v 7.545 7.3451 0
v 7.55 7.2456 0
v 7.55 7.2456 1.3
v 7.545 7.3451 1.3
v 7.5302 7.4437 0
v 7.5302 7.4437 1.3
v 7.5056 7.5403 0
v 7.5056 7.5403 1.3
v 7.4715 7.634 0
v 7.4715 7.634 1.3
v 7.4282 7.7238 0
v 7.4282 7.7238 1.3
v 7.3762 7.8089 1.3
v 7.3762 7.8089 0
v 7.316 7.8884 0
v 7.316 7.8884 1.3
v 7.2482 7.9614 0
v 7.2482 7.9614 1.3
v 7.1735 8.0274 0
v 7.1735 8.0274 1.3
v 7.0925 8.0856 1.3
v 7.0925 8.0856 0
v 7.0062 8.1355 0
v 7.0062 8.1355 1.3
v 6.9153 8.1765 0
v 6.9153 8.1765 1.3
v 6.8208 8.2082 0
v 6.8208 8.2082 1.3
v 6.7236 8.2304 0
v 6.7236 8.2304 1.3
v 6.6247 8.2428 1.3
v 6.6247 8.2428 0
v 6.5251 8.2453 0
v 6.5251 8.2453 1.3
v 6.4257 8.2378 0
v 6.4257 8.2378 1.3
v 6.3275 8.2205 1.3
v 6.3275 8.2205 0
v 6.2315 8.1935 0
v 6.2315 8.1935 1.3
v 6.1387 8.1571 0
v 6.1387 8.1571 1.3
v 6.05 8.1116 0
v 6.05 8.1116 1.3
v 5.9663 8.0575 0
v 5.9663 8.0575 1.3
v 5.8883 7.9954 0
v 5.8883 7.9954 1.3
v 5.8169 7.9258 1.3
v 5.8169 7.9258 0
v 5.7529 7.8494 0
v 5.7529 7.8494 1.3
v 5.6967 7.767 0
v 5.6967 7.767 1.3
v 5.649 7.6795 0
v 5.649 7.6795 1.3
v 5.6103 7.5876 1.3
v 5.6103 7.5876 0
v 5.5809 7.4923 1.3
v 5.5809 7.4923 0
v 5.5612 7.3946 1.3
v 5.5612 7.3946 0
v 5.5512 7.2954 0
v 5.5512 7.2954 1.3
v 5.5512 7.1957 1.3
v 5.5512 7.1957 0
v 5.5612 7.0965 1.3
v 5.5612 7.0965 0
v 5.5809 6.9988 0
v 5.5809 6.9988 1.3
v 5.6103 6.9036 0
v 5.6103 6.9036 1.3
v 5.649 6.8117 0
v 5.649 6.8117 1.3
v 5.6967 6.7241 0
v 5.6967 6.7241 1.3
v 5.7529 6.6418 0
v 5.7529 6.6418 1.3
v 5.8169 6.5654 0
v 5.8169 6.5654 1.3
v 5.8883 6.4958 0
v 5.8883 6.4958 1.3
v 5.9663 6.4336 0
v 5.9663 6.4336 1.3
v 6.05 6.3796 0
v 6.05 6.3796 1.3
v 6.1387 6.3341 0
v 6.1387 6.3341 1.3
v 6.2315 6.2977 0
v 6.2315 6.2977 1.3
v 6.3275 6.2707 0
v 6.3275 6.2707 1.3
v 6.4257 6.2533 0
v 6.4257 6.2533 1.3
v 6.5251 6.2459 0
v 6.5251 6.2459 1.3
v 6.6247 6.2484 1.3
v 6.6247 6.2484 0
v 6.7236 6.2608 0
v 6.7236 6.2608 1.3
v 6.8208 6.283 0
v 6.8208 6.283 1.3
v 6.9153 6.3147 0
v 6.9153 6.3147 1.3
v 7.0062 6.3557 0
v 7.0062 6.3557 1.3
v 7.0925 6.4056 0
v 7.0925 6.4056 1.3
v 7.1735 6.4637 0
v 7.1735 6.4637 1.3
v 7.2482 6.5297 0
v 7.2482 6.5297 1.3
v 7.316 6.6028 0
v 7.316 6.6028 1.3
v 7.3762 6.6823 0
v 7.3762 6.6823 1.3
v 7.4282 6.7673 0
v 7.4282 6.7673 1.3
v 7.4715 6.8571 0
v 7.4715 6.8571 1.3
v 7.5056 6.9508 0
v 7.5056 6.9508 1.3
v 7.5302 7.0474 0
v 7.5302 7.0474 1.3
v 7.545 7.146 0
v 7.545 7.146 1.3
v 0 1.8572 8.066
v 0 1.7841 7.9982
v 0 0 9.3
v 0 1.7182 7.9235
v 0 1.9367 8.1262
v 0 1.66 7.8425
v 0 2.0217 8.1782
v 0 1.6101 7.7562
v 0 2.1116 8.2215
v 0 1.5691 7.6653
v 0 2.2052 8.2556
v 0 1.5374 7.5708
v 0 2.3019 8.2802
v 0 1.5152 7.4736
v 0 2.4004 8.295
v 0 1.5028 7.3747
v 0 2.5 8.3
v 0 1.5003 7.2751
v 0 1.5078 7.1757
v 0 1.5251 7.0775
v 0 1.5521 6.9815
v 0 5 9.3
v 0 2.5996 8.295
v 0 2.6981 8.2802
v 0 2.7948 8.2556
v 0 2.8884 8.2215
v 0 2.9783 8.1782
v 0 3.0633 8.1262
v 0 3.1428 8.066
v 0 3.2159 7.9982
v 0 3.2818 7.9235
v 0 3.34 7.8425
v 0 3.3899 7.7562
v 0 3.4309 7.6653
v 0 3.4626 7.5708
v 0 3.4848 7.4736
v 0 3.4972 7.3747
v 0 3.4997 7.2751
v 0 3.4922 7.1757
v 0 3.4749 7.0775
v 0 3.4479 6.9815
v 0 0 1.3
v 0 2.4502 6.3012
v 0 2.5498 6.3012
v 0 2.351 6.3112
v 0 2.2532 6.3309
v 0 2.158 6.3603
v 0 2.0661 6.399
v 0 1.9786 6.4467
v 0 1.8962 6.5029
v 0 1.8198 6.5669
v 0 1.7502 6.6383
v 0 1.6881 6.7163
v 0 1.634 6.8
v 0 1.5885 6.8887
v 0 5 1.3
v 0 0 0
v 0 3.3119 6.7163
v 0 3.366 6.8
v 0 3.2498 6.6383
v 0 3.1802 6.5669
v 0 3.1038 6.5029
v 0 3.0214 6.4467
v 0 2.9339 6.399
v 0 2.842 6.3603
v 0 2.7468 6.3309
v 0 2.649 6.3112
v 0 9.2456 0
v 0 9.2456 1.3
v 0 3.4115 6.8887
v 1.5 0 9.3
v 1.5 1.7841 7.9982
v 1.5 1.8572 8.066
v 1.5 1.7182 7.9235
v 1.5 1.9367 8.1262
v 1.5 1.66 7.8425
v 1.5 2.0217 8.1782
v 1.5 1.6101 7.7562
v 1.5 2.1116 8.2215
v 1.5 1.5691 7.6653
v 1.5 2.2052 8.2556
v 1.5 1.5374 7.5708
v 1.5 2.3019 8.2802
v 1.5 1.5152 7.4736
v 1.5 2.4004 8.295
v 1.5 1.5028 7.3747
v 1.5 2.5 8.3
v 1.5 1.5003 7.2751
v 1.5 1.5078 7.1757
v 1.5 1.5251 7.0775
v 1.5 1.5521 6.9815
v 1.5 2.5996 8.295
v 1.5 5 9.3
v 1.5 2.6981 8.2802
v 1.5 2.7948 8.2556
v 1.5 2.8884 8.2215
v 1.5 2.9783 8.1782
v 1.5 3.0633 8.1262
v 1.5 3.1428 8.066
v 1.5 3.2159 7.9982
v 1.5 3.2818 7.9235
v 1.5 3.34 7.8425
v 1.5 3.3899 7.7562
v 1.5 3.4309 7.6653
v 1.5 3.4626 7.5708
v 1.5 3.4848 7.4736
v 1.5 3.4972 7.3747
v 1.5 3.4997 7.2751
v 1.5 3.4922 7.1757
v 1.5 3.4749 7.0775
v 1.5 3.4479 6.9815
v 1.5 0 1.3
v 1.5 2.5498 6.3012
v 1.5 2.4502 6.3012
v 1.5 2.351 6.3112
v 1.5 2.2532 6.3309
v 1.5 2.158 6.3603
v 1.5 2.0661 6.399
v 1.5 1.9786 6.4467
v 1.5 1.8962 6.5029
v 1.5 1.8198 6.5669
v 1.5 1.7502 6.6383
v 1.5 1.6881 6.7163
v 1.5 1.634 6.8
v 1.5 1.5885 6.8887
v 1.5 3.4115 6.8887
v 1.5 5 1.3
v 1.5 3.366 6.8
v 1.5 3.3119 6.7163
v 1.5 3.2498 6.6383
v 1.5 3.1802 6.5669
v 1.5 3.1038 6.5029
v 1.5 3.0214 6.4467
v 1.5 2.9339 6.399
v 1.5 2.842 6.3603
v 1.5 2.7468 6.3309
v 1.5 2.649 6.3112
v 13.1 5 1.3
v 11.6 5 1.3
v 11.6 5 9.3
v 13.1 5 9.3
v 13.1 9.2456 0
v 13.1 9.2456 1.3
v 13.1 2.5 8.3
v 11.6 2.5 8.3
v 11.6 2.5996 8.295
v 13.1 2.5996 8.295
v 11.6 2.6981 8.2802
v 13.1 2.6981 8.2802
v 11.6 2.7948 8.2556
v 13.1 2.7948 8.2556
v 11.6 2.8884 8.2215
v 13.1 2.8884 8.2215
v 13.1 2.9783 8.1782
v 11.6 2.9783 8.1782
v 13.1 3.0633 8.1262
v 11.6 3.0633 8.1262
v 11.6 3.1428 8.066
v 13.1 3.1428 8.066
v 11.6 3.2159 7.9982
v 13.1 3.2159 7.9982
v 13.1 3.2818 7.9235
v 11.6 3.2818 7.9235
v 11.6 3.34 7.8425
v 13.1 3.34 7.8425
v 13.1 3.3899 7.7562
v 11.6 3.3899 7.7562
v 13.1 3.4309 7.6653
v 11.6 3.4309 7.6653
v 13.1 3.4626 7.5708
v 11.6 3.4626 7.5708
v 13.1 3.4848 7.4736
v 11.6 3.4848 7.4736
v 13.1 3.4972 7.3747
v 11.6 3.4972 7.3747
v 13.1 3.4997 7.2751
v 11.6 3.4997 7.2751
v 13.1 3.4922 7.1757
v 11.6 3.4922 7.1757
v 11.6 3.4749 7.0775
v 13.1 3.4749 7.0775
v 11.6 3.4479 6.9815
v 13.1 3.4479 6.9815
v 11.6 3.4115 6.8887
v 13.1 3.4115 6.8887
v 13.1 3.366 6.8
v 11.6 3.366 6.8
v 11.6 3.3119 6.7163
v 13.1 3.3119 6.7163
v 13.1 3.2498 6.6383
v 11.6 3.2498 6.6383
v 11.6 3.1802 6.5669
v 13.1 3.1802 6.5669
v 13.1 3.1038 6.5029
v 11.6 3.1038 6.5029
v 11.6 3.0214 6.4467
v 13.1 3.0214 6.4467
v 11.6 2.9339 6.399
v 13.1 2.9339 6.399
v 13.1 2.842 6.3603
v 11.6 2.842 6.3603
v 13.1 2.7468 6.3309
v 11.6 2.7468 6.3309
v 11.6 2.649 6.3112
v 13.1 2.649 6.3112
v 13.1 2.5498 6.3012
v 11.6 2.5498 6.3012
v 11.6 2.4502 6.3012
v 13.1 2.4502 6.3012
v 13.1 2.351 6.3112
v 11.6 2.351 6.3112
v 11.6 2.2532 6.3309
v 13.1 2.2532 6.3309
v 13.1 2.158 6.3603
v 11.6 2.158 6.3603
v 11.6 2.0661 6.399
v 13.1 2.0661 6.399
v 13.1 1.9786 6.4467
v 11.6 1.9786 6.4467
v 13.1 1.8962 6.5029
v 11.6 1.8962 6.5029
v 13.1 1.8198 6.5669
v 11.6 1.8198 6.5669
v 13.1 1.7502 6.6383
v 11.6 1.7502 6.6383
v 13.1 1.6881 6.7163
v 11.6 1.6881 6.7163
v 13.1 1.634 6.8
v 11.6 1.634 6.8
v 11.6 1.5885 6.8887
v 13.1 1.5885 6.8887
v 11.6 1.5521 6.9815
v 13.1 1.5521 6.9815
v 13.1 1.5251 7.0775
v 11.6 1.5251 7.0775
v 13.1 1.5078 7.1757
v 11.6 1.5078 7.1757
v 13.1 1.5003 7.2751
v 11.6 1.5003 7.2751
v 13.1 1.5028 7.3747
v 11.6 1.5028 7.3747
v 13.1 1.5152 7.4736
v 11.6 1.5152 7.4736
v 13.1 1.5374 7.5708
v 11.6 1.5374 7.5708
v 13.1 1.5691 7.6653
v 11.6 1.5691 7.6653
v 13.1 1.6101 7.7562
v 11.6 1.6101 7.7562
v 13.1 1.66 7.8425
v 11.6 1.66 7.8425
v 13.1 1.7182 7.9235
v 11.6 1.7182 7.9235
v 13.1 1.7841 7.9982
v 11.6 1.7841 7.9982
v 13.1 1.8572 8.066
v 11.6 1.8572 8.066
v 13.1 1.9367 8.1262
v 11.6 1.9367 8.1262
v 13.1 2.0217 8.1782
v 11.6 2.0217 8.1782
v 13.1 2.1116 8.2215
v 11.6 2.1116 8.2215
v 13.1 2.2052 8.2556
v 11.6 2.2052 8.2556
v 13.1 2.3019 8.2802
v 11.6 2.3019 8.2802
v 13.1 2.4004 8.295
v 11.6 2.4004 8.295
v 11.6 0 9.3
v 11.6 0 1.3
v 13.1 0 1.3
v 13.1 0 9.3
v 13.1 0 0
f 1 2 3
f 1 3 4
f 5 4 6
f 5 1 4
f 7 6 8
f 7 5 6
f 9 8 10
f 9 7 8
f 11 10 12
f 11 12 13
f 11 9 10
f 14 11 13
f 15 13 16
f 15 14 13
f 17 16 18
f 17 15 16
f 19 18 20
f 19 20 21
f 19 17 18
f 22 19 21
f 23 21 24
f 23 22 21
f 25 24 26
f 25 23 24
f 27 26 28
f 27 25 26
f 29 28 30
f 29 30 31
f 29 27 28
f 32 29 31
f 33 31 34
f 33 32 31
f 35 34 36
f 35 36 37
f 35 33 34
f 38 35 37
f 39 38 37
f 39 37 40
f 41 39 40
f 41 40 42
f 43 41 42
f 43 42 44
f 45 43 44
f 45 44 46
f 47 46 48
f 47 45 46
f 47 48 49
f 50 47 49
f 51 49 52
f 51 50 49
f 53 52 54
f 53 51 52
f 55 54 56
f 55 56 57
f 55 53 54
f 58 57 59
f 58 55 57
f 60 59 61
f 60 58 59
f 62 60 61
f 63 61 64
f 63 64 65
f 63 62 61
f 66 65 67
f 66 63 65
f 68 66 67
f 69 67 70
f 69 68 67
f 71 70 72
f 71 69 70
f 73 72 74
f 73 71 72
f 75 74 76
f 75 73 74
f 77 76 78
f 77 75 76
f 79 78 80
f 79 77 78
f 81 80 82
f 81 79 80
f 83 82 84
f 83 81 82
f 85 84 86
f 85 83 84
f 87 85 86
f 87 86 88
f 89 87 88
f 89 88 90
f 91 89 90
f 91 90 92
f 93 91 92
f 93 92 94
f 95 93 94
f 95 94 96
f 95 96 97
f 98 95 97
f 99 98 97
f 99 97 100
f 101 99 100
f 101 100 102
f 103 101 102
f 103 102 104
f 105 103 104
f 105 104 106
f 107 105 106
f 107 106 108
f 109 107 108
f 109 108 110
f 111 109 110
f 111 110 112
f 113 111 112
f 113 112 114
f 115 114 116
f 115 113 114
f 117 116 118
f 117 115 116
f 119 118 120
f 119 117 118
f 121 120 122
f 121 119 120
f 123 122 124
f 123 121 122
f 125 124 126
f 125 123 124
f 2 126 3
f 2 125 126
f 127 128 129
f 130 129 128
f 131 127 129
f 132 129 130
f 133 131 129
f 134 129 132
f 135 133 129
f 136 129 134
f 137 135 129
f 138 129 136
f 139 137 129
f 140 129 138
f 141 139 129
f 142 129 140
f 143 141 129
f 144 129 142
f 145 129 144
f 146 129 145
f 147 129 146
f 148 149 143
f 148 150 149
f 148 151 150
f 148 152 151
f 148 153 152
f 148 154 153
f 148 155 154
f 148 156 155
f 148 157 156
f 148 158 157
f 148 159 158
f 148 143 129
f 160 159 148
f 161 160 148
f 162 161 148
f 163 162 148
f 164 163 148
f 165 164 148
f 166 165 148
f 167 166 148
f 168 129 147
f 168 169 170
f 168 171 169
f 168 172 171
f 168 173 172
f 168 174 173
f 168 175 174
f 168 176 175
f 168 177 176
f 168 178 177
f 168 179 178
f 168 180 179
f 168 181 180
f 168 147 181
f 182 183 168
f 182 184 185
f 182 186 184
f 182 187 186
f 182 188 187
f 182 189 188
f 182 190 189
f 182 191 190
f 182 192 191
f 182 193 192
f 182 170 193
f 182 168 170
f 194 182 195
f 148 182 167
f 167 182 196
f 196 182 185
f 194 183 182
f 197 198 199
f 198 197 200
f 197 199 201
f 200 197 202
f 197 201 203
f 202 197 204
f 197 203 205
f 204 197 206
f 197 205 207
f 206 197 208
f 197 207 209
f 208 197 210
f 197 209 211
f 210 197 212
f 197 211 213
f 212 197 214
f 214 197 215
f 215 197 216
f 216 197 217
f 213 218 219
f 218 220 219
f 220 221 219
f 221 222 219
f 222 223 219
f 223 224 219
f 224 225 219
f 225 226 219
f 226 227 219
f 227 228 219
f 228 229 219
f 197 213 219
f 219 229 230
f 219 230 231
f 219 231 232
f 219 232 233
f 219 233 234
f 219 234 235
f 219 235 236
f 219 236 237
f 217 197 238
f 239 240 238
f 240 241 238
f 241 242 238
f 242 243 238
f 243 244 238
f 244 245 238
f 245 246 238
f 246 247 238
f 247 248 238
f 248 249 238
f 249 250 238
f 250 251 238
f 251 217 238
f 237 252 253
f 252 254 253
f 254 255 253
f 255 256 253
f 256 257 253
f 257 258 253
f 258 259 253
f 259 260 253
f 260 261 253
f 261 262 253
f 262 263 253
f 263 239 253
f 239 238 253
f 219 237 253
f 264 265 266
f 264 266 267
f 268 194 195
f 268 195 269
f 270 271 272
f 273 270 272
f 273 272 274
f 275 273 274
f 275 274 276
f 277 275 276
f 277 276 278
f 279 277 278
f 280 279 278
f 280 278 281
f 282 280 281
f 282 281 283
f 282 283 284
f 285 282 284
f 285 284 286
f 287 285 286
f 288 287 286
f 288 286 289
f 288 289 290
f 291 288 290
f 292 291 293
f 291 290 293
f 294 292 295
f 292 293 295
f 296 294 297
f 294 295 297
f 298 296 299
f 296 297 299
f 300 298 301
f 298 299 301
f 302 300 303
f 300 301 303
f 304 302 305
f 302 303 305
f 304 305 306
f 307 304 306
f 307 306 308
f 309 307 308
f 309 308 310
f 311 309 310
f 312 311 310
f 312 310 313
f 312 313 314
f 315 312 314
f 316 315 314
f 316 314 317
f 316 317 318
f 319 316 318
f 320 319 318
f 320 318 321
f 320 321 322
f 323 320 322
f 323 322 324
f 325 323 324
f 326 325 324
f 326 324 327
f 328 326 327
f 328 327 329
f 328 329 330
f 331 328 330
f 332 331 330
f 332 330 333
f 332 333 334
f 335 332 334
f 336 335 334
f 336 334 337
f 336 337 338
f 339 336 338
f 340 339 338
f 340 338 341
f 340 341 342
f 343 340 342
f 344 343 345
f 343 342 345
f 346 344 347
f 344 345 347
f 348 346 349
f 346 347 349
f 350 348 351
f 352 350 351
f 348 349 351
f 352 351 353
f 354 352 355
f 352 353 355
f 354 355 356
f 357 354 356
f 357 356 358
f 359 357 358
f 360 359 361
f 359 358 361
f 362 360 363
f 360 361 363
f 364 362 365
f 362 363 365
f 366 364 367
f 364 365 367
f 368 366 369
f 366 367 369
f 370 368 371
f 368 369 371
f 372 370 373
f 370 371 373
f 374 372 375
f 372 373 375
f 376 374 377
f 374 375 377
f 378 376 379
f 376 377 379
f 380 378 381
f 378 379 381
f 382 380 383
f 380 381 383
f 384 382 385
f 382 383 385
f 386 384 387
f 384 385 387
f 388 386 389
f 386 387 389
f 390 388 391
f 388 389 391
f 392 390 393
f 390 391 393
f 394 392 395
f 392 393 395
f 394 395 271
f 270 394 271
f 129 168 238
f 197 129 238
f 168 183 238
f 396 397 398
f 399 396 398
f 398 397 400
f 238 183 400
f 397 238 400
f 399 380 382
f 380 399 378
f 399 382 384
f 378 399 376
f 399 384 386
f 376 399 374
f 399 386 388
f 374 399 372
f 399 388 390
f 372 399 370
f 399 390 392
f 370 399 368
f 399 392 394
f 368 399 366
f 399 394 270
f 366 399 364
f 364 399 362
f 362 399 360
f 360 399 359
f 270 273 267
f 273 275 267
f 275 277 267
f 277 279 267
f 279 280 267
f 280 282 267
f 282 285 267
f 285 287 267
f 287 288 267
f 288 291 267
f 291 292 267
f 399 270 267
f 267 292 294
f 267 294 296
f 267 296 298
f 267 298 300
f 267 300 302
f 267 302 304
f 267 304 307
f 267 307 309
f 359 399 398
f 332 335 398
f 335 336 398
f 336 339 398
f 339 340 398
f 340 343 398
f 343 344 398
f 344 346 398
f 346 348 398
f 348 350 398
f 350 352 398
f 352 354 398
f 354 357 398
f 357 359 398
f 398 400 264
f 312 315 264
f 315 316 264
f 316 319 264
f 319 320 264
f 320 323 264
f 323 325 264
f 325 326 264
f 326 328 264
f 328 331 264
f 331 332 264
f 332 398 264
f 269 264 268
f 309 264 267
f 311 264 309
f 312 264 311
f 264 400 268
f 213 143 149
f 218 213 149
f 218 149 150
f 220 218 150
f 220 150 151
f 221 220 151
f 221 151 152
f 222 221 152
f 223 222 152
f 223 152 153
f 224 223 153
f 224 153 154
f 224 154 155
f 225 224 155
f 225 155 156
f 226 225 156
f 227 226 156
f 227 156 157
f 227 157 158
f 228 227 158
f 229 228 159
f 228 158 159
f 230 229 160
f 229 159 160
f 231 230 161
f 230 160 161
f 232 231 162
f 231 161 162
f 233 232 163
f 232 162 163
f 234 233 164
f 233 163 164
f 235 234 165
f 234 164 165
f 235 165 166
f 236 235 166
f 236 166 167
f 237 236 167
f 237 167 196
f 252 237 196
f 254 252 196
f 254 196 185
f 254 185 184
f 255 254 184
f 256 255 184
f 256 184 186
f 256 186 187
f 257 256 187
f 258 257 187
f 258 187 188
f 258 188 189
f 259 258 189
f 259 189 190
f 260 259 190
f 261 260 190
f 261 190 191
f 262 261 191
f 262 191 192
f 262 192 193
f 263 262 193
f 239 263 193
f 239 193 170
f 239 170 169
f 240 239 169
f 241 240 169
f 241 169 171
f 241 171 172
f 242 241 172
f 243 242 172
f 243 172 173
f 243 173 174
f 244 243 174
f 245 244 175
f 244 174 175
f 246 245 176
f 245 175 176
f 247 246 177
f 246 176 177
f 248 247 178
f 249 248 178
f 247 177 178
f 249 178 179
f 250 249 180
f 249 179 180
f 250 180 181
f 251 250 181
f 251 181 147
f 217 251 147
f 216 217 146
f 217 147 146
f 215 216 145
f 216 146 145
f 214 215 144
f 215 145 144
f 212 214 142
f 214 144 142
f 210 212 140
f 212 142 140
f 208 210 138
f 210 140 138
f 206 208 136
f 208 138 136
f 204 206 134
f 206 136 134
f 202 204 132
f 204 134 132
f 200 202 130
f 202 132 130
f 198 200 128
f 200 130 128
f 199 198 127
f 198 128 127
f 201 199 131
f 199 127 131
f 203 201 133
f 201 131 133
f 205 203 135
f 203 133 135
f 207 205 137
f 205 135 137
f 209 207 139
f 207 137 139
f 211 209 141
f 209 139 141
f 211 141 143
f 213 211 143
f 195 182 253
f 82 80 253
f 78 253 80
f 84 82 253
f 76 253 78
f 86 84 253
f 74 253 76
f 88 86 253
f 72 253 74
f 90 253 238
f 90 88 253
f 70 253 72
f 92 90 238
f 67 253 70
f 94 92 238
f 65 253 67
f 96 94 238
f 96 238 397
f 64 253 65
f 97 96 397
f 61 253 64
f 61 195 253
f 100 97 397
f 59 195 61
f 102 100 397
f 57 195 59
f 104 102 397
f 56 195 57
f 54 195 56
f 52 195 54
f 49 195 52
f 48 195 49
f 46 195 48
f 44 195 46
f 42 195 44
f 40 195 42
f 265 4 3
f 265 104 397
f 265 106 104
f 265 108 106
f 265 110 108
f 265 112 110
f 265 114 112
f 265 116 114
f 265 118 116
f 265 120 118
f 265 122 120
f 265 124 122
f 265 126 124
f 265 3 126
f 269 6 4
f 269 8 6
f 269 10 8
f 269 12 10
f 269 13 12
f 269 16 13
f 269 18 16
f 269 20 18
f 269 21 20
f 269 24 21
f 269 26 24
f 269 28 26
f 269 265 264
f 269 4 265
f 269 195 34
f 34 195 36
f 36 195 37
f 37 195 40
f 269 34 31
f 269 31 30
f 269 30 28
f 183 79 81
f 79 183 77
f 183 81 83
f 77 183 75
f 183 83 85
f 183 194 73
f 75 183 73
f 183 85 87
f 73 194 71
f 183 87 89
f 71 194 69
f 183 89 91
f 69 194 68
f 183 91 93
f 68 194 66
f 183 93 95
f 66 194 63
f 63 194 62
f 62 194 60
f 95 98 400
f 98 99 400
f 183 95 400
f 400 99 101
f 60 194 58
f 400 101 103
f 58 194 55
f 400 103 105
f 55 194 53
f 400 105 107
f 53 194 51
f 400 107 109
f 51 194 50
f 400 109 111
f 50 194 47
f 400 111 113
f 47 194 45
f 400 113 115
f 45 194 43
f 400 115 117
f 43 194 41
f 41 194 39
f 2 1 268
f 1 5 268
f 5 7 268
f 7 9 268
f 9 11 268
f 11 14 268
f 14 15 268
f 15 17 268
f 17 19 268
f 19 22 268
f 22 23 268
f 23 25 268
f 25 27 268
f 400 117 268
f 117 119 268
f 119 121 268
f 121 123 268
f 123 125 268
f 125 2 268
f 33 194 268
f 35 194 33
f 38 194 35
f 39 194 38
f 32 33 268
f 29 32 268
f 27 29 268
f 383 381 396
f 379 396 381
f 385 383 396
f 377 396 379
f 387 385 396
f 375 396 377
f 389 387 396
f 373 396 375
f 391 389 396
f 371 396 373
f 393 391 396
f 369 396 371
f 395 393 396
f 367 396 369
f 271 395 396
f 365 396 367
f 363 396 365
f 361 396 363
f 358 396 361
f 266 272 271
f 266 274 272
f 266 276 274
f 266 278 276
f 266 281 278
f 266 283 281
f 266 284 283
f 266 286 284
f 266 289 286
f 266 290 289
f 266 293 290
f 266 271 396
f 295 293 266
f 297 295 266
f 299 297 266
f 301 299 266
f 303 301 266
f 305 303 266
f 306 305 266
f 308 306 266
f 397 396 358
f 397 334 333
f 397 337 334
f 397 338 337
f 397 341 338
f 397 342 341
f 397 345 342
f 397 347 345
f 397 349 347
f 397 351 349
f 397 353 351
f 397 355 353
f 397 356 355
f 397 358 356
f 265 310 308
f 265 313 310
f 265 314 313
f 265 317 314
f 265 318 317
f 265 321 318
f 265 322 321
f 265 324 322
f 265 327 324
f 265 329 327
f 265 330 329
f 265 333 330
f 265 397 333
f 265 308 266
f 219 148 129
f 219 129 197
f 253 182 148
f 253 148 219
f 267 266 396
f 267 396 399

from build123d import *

# Parameters (mm, degrees)
SKETCH_1_W          = 13.1
SKETCH_1_H          = 9.245579741
SKETCH_1_R          = 1
EXTRUDE_1_DEPTH     = 1.3
SKETCH_2_W          = 1.5
SKETCH_2_H          = 5
EXTRUDE_2_DEPTH     = 8
SKETCH_4_R          = 1
CUT_EXTRUDE_1_DEPTH = 15


with BuildPart() as part:
    # 草图1 → 凸台-拉伸1 (new body)
    with BuildSketch(Plane.XY):
        with Locations((6.55, 4.622789871)):
            Rectangle(SKETCH_1_W, SKETCH_1_H)
        with Locations((6.55, 7.245579741)):
            Circle(SKETCH_1_R, mode=Mode.SUBTRACT)
    extrude(amount=EXTRUDE_1_DEPTH)

    # 草图2 → 凸台-拉伸2 (add)
    with BuildSketch(Plane.XY.offset(1.3)):
        with Locations((0.75, 2.5)):
            Rectangle(SKETCH_2_W, SKETCH_2_H)
        with Locations((12.35, 2.5)):
            Rectangle(SKETCH_2_W, SKETCH_2_H)
    extrude(amount=EXTRUDE_2_DEPTH)

    # 草图4 → 切除-拉伸1 (cut)
    with BuildSketch(Plane.ZY):
        with Locations((7.3, 2.5)):
            Circle(SKETCH_4_R)
    extrude(amount=-CUT_EXTRUDE_1_DEPTH, mode=Mode.SUBTRACT)


solid = part.part
